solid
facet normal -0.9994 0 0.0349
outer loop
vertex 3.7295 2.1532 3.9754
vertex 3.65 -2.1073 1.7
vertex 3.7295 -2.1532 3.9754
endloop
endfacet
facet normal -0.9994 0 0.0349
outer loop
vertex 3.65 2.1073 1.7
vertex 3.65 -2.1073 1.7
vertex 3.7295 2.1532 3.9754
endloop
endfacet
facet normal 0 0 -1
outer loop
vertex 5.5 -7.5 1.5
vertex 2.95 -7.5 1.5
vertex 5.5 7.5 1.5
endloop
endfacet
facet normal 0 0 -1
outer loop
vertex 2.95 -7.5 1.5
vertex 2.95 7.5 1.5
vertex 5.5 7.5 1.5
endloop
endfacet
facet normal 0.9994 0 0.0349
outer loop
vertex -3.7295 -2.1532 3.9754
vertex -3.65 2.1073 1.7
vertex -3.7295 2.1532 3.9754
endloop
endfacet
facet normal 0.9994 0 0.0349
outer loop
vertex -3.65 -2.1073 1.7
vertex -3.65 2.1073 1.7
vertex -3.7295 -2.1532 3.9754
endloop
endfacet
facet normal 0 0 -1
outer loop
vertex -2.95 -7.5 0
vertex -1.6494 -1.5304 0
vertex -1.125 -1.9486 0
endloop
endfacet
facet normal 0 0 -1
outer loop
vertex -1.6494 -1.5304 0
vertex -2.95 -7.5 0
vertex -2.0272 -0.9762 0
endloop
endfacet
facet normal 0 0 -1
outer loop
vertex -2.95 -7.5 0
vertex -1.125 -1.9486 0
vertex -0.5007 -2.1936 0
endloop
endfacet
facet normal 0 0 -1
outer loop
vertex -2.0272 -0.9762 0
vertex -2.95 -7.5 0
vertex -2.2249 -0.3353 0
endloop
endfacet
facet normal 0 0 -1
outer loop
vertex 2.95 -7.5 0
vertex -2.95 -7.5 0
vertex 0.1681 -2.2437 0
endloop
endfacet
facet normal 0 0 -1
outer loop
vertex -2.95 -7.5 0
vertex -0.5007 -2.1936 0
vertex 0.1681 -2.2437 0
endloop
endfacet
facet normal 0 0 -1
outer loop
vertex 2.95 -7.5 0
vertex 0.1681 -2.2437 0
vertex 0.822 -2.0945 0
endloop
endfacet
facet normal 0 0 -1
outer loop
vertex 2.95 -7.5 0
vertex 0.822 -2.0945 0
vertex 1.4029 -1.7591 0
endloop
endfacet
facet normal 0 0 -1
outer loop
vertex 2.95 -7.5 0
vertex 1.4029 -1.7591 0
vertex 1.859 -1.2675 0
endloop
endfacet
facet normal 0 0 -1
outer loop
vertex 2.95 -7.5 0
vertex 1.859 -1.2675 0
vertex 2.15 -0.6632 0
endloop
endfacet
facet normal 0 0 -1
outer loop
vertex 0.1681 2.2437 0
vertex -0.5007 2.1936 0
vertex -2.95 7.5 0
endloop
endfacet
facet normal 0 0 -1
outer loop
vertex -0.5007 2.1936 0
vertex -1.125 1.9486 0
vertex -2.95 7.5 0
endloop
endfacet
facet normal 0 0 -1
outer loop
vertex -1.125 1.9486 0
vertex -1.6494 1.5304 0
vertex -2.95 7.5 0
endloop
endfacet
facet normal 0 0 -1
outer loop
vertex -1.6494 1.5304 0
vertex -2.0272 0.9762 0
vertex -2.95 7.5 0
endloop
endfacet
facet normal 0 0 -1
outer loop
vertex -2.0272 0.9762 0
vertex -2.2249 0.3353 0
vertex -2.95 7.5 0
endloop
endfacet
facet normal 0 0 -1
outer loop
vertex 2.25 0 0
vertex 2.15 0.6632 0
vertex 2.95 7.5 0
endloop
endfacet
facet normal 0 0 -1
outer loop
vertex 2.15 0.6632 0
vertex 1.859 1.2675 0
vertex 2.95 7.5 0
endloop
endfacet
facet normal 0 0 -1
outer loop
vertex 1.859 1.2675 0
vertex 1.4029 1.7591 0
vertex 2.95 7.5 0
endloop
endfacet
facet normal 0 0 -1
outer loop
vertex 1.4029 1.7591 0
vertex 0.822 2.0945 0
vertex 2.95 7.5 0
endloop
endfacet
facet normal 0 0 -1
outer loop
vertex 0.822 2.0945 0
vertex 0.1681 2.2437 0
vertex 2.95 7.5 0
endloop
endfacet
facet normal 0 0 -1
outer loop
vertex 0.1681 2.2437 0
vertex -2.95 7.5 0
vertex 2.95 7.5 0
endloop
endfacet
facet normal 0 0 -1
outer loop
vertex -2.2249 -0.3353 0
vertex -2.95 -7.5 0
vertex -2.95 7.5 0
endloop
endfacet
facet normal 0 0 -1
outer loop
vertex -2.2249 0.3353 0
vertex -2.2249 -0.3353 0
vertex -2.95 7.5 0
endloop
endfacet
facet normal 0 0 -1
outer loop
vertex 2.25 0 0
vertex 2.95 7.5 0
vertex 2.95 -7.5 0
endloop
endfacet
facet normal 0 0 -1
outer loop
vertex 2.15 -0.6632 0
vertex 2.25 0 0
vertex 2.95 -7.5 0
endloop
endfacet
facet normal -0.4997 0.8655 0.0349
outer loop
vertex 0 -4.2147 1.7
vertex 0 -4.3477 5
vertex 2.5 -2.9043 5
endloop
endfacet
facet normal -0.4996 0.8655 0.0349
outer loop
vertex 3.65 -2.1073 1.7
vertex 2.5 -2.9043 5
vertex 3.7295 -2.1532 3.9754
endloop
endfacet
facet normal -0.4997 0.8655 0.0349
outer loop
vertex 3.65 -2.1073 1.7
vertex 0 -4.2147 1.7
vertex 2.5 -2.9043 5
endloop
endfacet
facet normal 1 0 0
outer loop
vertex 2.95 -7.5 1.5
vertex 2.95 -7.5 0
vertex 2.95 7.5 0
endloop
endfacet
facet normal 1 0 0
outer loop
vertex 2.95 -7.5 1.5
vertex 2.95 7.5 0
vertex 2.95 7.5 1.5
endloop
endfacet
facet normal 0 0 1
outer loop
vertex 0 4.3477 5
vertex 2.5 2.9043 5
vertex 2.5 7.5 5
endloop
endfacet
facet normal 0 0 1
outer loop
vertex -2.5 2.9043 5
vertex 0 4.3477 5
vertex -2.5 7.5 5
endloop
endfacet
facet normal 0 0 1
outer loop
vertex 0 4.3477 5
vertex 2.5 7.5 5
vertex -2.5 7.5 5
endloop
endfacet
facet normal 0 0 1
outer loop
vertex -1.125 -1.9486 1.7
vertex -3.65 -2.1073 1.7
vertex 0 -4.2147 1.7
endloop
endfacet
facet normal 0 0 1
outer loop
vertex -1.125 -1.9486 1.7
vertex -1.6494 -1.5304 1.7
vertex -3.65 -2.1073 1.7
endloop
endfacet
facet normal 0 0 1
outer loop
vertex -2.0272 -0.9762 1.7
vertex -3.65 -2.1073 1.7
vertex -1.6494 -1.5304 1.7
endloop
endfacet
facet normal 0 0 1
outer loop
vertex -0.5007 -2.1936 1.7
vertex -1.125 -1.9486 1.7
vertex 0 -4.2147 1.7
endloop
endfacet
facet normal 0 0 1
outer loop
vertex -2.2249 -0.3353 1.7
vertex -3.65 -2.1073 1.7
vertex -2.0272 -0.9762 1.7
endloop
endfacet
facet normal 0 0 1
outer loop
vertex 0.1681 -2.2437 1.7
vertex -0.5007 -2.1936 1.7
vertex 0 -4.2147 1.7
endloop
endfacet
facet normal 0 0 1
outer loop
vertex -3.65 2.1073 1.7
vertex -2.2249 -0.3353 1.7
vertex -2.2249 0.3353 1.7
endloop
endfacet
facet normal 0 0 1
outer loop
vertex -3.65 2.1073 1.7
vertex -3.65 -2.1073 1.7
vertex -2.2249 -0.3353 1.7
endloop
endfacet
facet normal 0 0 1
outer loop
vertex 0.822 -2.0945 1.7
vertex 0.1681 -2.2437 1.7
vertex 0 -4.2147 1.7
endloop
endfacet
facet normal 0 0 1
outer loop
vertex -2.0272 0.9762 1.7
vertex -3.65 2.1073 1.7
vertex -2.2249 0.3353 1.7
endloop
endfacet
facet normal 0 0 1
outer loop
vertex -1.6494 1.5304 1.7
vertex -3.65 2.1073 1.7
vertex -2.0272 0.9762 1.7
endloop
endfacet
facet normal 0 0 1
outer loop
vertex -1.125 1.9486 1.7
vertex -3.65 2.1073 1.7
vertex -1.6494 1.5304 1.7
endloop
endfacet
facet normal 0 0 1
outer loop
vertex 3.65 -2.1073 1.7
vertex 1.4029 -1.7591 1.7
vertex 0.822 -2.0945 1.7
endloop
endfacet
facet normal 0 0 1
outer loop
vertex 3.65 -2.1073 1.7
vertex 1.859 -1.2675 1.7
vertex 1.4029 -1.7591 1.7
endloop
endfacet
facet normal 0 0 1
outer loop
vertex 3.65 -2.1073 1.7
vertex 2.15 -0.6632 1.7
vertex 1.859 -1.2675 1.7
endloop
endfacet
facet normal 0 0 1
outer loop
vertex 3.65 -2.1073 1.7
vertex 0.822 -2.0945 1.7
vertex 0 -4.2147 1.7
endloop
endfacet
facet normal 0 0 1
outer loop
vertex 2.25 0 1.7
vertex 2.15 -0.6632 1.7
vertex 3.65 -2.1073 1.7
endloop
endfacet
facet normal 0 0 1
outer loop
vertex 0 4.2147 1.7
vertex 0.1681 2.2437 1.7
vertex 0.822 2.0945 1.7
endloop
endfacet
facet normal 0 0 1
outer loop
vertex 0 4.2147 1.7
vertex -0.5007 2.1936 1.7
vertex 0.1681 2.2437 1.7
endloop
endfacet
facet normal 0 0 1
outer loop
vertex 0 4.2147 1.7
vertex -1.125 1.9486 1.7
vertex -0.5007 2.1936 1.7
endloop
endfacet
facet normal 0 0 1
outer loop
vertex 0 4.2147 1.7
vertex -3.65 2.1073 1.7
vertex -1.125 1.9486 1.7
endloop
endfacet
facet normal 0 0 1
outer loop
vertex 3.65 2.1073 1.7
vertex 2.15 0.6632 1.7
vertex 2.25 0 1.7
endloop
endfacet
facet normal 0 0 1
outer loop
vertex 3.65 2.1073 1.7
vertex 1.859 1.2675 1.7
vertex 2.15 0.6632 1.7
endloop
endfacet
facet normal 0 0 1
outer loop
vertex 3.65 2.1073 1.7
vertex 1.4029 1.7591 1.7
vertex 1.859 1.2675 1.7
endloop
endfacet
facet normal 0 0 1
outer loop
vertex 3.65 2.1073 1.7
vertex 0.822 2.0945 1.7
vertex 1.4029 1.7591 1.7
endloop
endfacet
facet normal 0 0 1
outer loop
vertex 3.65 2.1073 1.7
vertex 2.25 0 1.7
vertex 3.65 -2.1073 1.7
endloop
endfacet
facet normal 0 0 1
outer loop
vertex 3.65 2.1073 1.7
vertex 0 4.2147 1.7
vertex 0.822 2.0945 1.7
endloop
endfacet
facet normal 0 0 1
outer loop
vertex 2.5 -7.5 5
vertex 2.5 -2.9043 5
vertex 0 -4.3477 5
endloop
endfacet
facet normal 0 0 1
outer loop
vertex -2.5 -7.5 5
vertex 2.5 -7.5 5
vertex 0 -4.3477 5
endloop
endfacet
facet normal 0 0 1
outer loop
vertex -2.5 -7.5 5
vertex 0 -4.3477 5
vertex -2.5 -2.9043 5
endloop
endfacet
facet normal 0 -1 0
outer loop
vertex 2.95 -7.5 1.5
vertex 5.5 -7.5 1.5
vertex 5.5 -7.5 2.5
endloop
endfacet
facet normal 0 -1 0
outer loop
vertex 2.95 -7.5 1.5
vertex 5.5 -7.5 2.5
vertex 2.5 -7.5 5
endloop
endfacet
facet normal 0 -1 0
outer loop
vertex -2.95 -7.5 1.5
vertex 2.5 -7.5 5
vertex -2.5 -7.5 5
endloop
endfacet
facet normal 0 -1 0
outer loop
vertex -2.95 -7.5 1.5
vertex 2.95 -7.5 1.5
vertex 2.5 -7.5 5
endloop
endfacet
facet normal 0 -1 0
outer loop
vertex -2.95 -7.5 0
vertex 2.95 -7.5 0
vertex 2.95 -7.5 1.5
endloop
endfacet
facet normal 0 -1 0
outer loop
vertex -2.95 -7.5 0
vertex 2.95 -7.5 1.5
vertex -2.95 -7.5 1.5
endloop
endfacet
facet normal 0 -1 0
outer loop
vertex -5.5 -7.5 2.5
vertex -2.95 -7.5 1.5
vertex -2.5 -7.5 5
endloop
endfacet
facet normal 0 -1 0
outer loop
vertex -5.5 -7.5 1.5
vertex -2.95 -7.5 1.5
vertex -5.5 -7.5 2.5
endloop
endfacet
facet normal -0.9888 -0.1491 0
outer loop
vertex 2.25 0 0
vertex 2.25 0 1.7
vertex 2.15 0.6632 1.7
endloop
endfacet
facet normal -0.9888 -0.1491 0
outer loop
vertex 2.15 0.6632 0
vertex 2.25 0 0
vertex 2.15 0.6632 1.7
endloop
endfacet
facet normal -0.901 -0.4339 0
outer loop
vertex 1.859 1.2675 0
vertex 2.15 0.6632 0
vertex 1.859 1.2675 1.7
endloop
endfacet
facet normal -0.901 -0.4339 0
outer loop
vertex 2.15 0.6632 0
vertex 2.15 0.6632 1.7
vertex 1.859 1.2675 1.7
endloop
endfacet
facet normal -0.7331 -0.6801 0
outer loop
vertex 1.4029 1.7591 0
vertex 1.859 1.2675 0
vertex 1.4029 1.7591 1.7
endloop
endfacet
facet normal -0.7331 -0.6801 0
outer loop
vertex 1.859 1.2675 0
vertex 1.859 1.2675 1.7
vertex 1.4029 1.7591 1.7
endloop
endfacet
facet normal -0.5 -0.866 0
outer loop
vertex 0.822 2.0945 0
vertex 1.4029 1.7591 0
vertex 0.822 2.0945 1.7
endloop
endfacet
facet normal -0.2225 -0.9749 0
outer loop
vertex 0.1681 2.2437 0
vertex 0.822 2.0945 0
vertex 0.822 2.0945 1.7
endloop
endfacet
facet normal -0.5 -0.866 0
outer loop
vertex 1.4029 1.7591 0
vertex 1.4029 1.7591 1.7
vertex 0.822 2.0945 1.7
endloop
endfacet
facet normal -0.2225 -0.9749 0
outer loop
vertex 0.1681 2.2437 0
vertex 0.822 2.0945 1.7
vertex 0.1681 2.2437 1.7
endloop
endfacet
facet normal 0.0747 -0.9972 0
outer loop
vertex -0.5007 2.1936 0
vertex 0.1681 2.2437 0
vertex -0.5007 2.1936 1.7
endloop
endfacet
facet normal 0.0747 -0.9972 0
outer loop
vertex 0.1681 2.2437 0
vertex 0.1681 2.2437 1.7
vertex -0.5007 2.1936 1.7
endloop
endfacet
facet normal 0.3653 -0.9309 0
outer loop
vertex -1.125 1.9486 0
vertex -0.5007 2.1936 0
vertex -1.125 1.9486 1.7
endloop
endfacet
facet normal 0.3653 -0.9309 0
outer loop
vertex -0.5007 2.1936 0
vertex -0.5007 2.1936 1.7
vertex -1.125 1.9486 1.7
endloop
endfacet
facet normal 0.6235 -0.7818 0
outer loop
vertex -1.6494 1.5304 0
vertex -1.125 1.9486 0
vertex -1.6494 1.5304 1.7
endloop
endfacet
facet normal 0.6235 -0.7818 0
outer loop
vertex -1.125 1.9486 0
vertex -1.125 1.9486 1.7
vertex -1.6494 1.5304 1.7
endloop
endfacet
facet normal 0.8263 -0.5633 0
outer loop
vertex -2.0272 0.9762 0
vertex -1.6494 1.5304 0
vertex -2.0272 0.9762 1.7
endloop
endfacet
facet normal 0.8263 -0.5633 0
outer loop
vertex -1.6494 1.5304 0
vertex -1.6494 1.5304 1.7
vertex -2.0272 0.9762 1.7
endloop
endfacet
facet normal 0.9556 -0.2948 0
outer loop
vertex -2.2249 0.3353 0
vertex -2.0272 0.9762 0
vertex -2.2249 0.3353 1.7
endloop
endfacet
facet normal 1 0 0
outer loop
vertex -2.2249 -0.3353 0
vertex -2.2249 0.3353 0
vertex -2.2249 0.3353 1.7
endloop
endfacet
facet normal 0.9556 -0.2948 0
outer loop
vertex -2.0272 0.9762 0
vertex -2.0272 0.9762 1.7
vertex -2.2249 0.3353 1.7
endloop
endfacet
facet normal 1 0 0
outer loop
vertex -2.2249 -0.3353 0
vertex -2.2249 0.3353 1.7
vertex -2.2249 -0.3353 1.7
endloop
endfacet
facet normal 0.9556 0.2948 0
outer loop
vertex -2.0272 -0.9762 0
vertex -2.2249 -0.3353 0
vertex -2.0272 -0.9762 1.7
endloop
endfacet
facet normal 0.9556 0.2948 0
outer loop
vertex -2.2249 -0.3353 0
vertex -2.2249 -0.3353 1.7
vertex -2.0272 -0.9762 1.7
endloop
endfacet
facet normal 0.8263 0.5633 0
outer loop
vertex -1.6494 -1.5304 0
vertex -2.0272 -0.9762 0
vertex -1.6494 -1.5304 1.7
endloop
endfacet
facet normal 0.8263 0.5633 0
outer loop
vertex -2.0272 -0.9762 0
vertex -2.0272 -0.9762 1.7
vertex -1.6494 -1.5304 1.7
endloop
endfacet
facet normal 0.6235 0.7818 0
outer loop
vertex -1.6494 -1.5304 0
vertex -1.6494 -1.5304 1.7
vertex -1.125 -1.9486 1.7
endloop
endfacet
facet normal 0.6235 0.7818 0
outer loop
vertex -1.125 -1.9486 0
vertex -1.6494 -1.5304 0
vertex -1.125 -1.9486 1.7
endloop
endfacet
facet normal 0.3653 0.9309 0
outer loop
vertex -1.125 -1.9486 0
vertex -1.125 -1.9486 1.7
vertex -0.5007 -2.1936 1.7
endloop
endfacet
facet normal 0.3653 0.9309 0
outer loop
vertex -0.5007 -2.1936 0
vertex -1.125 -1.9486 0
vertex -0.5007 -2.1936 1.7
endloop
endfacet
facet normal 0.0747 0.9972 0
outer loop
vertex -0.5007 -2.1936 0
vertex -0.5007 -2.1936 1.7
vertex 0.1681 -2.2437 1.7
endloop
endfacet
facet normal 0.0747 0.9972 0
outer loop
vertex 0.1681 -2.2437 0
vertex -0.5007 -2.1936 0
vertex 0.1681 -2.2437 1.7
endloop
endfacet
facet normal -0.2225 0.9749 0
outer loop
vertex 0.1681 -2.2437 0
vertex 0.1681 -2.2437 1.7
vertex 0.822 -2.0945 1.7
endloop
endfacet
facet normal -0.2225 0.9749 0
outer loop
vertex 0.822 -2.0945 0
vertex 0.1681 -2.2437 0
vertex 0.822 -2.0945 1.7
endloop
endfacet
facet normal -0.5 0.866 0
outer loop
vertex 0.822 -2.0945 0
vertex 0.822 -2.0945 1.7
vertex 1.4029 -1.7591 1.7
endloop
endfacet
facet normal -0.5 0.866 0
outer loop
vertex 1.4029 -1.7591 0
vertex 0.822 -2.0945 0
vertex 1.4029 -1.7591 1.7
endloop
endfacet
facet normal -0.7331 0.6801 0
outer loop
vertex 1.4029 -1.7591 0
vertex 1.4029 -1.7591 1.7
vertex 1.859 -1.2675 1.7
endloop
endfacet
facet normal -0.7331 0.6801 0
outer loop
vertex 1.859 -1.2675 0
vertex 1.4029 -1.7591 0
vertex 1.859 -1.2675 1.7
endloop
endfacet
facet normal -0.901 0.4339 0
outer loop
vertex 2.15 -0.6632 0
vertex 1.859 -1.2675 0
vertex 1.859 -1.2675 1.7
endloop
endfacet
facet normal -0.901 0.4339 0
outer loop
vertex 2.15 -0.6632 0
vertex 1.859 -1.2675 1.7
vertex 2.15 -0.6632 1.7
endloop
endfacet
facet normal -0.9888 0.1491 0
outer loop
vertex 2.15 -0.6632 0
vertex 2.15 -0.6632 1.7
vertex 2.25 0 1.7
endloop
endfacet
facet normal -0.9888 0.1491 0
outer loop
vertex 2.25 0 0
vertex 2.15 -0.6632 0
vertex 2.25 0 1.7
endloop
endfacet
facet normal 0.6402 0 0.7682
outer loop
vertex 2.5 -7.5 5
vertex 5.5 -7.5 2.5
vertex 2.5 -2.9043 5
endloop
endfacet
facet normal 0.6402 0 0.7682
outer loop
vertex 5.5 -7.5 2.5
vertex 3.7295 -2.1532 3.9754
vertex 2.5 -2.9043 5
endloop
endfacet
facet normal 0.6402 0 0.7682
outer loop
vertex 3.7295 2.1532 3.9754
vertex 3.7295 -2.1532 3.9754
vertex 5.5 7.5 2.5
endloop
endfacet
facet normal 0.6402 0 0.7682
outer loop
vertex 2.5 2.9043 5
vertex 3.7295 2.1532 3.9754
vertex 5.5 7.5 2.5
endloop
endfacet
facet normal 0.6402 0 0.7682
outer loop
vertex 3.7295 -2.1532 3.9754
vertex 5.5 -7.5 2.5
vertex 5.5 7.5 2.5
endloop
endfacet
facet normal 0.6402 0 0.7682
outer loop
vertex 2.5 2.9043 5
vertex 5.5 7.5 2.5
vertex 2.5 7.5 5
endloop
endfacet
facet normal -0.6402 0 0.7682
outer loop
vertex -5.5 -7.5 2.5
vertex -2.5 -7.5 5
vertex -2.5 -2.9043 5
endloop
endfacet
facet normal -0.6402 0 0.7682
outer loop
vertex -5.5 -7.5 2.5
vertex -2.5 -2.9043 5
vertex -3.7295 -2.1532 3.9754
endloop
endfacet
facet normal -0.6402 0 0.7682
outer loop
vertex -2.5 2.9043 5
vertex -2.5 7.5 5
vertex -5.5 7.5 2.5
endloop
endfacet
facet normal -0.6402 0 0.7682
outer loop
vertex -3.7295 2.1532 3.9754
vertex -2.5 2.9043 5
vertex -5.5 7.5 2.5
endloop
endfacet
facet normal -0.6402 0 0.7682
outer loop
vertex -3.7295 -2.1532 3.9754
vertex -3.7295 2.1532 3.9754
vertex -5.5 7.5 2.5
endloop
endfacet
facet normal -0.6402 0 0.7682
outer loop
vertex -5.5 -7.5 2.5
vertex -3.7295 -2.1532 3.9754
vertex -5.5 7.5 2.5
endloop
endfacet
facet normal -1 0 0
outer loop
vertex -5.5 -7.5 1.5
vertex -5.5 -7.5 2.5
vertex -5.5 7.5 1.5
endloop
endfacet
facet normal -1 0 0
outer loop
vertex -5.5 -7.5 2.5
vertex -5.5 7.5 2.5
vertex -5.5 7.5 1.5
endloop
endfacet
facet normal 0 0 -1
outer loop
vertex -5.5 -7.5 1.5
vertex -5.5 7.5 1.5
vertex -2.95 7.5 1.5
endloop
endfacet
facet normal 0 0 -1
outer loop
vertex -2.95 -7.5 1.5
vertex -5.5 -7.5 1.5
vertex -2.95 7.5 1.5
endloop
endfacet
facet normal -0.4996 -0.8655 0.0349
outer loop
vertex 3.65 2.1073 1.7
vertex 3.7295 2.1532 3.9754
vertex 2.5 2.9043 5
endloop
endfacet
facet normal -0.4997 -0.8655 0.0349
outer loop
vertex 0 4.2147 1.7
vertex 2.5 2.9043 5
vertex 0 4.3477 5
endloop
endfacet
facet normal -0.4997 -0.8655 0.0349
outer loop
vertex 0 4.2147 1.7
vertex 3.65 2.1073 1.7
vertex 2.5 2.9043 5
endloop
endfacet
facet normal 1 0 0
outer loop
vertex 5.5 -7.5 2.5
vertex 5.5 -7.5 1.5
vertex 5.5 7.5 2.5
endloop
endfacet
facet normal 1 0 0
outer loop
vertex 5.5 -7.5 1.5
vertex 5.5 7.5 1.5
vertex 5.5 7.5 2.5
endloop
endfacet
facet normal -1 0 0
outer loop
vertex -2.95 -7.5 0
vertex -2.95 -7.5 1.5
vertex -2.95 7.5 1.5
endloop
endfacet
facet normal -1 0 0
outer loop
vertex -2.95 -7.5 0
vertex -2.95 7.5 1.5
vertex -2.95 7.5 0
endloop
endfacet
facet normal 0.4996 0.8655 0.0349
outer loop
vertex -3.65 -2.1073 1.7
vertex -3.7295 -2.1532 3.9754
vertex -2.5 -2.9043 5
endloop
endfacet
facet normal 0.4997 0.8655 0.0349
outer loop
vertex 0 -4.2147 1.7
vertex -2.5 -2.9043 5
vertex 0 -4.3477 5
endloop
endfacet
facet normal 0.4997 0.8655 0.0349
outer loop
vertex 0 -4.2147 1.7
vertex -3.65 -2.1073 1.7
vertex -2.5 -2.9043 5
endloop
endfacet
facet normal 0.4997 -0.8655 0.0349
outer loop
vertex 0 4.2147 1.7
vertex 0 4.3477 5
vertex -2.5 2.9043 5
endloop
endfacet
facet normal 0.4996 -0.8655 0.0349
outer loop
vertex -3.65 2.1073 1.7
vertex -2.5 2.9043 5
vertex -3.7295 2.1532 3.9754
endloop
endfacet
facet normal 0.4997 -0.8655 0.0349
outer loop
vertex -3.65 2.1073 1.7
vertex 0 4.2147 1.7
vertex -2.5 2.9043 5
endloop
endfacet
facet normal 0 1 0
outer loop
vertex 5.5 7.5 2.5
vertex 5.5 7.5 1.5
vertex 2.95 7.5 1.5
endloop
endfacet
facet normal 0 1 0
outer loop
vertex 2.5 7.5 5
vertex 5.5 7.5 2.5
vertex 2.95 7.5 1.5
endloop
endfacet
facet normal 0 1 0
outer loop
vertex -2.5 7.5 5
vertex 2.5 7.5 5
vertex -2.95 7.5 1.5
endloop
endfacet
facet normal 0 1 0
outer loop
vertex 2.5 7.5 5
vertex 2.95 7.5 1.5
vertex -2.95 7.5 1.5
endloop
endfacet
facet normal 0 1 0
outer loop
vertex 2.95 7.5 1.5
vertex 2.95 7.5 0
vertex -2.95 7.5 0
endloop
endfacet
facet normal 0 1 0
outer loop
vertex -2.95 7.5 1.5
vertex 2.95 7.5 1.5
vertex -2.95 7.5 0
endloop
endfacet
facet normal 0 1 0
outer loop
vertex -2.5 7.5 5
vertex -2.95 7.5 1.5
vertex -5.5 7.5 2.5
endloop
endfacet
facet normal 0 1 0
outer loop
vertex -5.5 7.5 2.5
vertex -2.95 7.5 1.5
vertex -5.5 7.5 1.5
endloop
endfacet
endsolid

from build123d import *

# Parameters (mm, degrees)
BOSS_EXTRUDE1_DEPTH = 7.5
SKETCH2_R           = 2.25
CUT_EXTRUDE1_DEPTH  = 11.559356041
CUT_EXTRUDE2_START  = -3.3
CUT_EXTRUDE2_DEPTH  = 14.859356041
CUT_EXTRUDE2_DRAFT  = -2


with BuildPart() as part:
    # Sketch1 → Boss-Extrude1 (new, symmetric)
    with BuildSketch(Plane(origin=(0, 0, 0), x_dir=(1, 0, 0), z_dir=(0, 1, 0))):
        Polygon((-2.95, 0), (2.95, 0), (2.95, -1.5), (5.5, -1.5), (5.5, -2.5), (2.5, -5), (-2.5, -5), (-5.5, -2.5), (-5.5, -1.5), (-2.95, -1.5), align=None)
    extrude(amount=BOSS_EXTRUDE1_DEPTH, both=True)

    # Sketch2 → Cut-Extrude1 (cut, through all)
    with BuildSketch(Plane.XY.offset(5)):
        Circle(SKETCH2_R)
    extrude(amount=-CUT_EXTRUDE1_DEPTH, mode=Mode.SUBTRACT)


with BuildPart() as cut_extrude2_tool:
    # Sketch3 → Cut-Extrude2 (with draft: the straight prism first)
    with BuildSketch(Plane.XY.offset(5).offset(CUT_EXTRUDE2_START)):
        Polygon((0, 4.214656965), (-3.65, 2.107328483), (-3.65, -2.107328483), (0, -4.214656965), (3.65, -2.107328483), (3.65, 2.107328483), align=None)
    extrude(amount=CUT_EXTRUDE2_DEPTH)
    # Cut-Extrude2: the draft: its side faces are tilted about the plane it starts from
    cut_extrude2_sides = [cut_extrude2_tool.faces().sort_by_distance(p)[0] for p in [
        (-1.825, 3.160992724, 9.12967802),
        (-3.65, 0, 9.12967802),
        (-1.825, -3.160992724, 9.12967802),
        (1.825, -3.160992724, 9.12967802),
        (3.65, 0, 9.12967802),
        (1.825, 3.160992724, 9.12967802),
    ]]
    draft(cut_extrude2_sides, Plane.XY.offset(5).offset(CUT_EXTRUDE2_START), CUT_EXTRUDE2_DRAFT)


with BuildPart() as part_1:
    add(part.part)

    # Cut-Extrude2: cut by cut_extrude2_tool
    add(cut_extrude2_tool.part, mode=Mode.SUBTRACT)


solid = part_1.part
